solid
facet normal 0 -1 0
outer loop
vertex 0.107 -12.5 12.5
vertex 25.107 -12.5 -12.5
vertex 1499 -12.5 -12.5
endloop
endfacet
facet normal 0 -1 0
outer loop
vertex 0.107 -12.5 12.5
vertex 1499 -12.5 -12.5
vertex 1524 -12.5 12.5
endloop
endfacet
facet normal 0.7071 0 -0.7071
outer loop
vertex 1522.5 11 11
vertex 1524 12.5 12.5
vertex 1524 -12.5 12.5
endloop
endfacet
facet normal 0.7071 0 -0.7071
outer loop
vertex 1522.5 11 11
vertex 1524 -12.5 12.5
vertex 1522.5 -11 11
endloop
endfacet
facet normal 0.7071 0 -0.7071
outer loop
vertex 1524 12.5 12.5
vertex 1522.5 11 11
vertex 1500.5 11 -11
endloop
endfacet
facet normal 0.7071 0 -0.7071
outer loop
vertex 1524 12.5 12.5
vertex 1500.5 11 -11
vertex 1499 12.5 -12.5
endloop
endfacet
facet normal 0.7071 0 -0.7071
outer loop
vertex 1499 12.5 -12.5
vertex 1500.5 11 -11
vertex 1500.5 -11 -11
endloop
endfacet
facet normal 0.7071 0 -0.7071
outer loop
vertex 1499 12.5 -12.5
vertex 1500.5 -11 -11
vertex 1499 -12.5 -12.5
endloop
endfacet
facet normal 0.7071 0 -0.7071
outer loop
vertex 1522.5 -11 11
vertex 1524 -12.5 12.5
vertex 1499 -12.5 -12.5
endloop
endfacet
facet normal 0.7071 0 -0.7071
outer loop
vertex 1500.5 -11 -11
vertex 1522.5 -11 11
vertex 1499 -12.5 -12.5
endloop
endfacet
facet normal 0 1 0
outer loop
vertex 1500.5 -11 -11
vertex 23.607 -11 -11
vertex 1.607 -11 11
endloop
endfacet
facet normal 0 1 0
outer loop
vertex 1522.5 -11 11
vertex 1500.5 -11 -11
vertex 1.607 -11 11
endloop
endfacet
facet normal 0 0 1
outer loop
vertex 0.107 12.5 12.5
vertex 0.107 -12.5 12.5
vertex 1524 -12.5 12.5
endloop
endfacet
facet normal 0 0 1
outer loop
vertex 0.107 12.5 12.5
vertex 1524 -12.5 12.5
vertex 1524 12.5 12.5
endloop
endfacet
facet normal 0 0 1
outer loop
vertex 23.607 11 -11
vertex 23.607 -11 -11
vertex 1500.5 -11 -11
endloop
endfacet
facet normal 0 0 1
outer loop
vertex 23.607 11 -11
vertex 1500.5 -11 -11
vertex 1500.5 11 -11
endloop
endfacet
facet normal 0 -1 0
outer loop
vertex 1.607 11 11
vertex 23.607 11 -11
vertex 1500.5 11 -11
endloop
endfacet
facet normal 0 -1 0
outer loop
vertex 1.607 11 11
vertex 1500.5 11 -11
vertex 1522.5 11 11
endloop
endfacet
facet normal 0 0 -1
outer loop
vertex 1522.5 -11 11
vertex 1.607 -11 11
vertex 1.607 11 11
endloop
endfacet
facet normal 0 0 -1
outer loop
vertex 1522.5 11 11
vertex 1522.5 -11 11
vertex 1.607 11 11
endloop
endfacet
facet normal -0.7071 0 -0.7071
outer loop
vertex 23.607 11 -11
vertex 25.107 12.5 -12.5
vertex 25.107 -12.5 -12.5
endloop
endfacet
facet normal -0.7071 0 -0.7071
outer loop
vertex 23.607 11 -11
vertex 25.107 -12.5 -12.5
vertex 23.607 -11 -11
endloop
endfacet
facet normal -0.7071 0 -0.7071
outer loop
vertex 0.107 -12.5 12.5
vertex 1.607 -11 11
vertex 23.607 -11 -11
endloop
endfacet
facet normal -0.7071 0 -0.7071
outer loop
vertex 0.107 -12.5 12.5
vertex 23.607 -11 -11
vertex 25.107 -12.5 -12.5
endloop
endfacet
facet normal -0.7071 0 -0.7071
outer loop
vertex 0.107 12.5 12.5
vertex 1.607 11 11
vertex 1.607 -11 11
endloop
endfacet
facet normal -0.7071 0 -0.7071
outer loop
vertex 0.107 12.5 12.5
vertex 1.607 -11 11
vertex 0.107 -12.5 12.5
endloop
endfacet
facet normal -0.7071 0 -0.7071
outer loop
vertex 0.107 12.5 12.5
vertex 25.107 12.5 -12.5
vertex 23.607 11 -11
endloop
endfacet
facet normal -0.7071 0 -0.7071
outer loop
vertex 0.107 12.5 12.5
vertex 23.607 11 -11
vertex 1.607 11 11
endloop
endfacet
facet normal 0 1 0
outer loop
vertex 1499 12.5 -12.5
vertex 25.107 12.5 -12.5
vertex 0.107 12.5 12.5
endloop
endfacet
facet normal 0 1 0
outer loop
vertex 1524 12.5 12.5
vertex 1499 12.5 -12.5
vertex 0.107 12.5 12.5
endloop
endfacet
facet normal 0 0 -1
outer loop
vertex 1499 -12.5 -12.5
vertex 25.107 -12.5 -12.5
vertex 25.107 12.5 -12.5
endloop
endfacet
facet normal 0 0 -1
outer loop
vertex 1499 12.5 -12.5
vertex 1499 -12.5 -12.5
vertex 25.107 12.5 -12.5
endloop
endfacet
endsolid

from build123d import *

# Parameters (mm, degrees)
F0_W     = 25
F0_H     = 25
F1_DEPTH = 1524
F3_DEPTH = 12.5
F4_W     = 22
F4_H     = 22
F5_DEPTH = 1524.001


with BuildPart() as f1:
    # F0 (on Right) → F1 (new body)
    with BuildSketch(Plane.YZ):
        Rectangle(F0_W, F0_H)
    extrude(amount=F1_DEPTH)

    # F2 (on Front) → F3 (cut, symmetric)
    with BuildSketch(Plane.XZ):
        Polygon((35.352029, -22.745401), (0, 12.606628), (0, -26.686775), align=None)
        Polygon((1524, -22.745401), (1524, 12.5), (1494.63703, -16.86297), align=None)
    extrude(amount=F3_DEPTH, both=True, mode=Mode.SUBTRACT)

    # F4 (on Right) → F5 (cut, through all)
    with BuildSketch(Plane.YZ):
        Rectangle(F4_W, F4_H)
    extrude(amount=F5_DEPTH, mode=Mode.SUBTRACT)


solid = f1.part
